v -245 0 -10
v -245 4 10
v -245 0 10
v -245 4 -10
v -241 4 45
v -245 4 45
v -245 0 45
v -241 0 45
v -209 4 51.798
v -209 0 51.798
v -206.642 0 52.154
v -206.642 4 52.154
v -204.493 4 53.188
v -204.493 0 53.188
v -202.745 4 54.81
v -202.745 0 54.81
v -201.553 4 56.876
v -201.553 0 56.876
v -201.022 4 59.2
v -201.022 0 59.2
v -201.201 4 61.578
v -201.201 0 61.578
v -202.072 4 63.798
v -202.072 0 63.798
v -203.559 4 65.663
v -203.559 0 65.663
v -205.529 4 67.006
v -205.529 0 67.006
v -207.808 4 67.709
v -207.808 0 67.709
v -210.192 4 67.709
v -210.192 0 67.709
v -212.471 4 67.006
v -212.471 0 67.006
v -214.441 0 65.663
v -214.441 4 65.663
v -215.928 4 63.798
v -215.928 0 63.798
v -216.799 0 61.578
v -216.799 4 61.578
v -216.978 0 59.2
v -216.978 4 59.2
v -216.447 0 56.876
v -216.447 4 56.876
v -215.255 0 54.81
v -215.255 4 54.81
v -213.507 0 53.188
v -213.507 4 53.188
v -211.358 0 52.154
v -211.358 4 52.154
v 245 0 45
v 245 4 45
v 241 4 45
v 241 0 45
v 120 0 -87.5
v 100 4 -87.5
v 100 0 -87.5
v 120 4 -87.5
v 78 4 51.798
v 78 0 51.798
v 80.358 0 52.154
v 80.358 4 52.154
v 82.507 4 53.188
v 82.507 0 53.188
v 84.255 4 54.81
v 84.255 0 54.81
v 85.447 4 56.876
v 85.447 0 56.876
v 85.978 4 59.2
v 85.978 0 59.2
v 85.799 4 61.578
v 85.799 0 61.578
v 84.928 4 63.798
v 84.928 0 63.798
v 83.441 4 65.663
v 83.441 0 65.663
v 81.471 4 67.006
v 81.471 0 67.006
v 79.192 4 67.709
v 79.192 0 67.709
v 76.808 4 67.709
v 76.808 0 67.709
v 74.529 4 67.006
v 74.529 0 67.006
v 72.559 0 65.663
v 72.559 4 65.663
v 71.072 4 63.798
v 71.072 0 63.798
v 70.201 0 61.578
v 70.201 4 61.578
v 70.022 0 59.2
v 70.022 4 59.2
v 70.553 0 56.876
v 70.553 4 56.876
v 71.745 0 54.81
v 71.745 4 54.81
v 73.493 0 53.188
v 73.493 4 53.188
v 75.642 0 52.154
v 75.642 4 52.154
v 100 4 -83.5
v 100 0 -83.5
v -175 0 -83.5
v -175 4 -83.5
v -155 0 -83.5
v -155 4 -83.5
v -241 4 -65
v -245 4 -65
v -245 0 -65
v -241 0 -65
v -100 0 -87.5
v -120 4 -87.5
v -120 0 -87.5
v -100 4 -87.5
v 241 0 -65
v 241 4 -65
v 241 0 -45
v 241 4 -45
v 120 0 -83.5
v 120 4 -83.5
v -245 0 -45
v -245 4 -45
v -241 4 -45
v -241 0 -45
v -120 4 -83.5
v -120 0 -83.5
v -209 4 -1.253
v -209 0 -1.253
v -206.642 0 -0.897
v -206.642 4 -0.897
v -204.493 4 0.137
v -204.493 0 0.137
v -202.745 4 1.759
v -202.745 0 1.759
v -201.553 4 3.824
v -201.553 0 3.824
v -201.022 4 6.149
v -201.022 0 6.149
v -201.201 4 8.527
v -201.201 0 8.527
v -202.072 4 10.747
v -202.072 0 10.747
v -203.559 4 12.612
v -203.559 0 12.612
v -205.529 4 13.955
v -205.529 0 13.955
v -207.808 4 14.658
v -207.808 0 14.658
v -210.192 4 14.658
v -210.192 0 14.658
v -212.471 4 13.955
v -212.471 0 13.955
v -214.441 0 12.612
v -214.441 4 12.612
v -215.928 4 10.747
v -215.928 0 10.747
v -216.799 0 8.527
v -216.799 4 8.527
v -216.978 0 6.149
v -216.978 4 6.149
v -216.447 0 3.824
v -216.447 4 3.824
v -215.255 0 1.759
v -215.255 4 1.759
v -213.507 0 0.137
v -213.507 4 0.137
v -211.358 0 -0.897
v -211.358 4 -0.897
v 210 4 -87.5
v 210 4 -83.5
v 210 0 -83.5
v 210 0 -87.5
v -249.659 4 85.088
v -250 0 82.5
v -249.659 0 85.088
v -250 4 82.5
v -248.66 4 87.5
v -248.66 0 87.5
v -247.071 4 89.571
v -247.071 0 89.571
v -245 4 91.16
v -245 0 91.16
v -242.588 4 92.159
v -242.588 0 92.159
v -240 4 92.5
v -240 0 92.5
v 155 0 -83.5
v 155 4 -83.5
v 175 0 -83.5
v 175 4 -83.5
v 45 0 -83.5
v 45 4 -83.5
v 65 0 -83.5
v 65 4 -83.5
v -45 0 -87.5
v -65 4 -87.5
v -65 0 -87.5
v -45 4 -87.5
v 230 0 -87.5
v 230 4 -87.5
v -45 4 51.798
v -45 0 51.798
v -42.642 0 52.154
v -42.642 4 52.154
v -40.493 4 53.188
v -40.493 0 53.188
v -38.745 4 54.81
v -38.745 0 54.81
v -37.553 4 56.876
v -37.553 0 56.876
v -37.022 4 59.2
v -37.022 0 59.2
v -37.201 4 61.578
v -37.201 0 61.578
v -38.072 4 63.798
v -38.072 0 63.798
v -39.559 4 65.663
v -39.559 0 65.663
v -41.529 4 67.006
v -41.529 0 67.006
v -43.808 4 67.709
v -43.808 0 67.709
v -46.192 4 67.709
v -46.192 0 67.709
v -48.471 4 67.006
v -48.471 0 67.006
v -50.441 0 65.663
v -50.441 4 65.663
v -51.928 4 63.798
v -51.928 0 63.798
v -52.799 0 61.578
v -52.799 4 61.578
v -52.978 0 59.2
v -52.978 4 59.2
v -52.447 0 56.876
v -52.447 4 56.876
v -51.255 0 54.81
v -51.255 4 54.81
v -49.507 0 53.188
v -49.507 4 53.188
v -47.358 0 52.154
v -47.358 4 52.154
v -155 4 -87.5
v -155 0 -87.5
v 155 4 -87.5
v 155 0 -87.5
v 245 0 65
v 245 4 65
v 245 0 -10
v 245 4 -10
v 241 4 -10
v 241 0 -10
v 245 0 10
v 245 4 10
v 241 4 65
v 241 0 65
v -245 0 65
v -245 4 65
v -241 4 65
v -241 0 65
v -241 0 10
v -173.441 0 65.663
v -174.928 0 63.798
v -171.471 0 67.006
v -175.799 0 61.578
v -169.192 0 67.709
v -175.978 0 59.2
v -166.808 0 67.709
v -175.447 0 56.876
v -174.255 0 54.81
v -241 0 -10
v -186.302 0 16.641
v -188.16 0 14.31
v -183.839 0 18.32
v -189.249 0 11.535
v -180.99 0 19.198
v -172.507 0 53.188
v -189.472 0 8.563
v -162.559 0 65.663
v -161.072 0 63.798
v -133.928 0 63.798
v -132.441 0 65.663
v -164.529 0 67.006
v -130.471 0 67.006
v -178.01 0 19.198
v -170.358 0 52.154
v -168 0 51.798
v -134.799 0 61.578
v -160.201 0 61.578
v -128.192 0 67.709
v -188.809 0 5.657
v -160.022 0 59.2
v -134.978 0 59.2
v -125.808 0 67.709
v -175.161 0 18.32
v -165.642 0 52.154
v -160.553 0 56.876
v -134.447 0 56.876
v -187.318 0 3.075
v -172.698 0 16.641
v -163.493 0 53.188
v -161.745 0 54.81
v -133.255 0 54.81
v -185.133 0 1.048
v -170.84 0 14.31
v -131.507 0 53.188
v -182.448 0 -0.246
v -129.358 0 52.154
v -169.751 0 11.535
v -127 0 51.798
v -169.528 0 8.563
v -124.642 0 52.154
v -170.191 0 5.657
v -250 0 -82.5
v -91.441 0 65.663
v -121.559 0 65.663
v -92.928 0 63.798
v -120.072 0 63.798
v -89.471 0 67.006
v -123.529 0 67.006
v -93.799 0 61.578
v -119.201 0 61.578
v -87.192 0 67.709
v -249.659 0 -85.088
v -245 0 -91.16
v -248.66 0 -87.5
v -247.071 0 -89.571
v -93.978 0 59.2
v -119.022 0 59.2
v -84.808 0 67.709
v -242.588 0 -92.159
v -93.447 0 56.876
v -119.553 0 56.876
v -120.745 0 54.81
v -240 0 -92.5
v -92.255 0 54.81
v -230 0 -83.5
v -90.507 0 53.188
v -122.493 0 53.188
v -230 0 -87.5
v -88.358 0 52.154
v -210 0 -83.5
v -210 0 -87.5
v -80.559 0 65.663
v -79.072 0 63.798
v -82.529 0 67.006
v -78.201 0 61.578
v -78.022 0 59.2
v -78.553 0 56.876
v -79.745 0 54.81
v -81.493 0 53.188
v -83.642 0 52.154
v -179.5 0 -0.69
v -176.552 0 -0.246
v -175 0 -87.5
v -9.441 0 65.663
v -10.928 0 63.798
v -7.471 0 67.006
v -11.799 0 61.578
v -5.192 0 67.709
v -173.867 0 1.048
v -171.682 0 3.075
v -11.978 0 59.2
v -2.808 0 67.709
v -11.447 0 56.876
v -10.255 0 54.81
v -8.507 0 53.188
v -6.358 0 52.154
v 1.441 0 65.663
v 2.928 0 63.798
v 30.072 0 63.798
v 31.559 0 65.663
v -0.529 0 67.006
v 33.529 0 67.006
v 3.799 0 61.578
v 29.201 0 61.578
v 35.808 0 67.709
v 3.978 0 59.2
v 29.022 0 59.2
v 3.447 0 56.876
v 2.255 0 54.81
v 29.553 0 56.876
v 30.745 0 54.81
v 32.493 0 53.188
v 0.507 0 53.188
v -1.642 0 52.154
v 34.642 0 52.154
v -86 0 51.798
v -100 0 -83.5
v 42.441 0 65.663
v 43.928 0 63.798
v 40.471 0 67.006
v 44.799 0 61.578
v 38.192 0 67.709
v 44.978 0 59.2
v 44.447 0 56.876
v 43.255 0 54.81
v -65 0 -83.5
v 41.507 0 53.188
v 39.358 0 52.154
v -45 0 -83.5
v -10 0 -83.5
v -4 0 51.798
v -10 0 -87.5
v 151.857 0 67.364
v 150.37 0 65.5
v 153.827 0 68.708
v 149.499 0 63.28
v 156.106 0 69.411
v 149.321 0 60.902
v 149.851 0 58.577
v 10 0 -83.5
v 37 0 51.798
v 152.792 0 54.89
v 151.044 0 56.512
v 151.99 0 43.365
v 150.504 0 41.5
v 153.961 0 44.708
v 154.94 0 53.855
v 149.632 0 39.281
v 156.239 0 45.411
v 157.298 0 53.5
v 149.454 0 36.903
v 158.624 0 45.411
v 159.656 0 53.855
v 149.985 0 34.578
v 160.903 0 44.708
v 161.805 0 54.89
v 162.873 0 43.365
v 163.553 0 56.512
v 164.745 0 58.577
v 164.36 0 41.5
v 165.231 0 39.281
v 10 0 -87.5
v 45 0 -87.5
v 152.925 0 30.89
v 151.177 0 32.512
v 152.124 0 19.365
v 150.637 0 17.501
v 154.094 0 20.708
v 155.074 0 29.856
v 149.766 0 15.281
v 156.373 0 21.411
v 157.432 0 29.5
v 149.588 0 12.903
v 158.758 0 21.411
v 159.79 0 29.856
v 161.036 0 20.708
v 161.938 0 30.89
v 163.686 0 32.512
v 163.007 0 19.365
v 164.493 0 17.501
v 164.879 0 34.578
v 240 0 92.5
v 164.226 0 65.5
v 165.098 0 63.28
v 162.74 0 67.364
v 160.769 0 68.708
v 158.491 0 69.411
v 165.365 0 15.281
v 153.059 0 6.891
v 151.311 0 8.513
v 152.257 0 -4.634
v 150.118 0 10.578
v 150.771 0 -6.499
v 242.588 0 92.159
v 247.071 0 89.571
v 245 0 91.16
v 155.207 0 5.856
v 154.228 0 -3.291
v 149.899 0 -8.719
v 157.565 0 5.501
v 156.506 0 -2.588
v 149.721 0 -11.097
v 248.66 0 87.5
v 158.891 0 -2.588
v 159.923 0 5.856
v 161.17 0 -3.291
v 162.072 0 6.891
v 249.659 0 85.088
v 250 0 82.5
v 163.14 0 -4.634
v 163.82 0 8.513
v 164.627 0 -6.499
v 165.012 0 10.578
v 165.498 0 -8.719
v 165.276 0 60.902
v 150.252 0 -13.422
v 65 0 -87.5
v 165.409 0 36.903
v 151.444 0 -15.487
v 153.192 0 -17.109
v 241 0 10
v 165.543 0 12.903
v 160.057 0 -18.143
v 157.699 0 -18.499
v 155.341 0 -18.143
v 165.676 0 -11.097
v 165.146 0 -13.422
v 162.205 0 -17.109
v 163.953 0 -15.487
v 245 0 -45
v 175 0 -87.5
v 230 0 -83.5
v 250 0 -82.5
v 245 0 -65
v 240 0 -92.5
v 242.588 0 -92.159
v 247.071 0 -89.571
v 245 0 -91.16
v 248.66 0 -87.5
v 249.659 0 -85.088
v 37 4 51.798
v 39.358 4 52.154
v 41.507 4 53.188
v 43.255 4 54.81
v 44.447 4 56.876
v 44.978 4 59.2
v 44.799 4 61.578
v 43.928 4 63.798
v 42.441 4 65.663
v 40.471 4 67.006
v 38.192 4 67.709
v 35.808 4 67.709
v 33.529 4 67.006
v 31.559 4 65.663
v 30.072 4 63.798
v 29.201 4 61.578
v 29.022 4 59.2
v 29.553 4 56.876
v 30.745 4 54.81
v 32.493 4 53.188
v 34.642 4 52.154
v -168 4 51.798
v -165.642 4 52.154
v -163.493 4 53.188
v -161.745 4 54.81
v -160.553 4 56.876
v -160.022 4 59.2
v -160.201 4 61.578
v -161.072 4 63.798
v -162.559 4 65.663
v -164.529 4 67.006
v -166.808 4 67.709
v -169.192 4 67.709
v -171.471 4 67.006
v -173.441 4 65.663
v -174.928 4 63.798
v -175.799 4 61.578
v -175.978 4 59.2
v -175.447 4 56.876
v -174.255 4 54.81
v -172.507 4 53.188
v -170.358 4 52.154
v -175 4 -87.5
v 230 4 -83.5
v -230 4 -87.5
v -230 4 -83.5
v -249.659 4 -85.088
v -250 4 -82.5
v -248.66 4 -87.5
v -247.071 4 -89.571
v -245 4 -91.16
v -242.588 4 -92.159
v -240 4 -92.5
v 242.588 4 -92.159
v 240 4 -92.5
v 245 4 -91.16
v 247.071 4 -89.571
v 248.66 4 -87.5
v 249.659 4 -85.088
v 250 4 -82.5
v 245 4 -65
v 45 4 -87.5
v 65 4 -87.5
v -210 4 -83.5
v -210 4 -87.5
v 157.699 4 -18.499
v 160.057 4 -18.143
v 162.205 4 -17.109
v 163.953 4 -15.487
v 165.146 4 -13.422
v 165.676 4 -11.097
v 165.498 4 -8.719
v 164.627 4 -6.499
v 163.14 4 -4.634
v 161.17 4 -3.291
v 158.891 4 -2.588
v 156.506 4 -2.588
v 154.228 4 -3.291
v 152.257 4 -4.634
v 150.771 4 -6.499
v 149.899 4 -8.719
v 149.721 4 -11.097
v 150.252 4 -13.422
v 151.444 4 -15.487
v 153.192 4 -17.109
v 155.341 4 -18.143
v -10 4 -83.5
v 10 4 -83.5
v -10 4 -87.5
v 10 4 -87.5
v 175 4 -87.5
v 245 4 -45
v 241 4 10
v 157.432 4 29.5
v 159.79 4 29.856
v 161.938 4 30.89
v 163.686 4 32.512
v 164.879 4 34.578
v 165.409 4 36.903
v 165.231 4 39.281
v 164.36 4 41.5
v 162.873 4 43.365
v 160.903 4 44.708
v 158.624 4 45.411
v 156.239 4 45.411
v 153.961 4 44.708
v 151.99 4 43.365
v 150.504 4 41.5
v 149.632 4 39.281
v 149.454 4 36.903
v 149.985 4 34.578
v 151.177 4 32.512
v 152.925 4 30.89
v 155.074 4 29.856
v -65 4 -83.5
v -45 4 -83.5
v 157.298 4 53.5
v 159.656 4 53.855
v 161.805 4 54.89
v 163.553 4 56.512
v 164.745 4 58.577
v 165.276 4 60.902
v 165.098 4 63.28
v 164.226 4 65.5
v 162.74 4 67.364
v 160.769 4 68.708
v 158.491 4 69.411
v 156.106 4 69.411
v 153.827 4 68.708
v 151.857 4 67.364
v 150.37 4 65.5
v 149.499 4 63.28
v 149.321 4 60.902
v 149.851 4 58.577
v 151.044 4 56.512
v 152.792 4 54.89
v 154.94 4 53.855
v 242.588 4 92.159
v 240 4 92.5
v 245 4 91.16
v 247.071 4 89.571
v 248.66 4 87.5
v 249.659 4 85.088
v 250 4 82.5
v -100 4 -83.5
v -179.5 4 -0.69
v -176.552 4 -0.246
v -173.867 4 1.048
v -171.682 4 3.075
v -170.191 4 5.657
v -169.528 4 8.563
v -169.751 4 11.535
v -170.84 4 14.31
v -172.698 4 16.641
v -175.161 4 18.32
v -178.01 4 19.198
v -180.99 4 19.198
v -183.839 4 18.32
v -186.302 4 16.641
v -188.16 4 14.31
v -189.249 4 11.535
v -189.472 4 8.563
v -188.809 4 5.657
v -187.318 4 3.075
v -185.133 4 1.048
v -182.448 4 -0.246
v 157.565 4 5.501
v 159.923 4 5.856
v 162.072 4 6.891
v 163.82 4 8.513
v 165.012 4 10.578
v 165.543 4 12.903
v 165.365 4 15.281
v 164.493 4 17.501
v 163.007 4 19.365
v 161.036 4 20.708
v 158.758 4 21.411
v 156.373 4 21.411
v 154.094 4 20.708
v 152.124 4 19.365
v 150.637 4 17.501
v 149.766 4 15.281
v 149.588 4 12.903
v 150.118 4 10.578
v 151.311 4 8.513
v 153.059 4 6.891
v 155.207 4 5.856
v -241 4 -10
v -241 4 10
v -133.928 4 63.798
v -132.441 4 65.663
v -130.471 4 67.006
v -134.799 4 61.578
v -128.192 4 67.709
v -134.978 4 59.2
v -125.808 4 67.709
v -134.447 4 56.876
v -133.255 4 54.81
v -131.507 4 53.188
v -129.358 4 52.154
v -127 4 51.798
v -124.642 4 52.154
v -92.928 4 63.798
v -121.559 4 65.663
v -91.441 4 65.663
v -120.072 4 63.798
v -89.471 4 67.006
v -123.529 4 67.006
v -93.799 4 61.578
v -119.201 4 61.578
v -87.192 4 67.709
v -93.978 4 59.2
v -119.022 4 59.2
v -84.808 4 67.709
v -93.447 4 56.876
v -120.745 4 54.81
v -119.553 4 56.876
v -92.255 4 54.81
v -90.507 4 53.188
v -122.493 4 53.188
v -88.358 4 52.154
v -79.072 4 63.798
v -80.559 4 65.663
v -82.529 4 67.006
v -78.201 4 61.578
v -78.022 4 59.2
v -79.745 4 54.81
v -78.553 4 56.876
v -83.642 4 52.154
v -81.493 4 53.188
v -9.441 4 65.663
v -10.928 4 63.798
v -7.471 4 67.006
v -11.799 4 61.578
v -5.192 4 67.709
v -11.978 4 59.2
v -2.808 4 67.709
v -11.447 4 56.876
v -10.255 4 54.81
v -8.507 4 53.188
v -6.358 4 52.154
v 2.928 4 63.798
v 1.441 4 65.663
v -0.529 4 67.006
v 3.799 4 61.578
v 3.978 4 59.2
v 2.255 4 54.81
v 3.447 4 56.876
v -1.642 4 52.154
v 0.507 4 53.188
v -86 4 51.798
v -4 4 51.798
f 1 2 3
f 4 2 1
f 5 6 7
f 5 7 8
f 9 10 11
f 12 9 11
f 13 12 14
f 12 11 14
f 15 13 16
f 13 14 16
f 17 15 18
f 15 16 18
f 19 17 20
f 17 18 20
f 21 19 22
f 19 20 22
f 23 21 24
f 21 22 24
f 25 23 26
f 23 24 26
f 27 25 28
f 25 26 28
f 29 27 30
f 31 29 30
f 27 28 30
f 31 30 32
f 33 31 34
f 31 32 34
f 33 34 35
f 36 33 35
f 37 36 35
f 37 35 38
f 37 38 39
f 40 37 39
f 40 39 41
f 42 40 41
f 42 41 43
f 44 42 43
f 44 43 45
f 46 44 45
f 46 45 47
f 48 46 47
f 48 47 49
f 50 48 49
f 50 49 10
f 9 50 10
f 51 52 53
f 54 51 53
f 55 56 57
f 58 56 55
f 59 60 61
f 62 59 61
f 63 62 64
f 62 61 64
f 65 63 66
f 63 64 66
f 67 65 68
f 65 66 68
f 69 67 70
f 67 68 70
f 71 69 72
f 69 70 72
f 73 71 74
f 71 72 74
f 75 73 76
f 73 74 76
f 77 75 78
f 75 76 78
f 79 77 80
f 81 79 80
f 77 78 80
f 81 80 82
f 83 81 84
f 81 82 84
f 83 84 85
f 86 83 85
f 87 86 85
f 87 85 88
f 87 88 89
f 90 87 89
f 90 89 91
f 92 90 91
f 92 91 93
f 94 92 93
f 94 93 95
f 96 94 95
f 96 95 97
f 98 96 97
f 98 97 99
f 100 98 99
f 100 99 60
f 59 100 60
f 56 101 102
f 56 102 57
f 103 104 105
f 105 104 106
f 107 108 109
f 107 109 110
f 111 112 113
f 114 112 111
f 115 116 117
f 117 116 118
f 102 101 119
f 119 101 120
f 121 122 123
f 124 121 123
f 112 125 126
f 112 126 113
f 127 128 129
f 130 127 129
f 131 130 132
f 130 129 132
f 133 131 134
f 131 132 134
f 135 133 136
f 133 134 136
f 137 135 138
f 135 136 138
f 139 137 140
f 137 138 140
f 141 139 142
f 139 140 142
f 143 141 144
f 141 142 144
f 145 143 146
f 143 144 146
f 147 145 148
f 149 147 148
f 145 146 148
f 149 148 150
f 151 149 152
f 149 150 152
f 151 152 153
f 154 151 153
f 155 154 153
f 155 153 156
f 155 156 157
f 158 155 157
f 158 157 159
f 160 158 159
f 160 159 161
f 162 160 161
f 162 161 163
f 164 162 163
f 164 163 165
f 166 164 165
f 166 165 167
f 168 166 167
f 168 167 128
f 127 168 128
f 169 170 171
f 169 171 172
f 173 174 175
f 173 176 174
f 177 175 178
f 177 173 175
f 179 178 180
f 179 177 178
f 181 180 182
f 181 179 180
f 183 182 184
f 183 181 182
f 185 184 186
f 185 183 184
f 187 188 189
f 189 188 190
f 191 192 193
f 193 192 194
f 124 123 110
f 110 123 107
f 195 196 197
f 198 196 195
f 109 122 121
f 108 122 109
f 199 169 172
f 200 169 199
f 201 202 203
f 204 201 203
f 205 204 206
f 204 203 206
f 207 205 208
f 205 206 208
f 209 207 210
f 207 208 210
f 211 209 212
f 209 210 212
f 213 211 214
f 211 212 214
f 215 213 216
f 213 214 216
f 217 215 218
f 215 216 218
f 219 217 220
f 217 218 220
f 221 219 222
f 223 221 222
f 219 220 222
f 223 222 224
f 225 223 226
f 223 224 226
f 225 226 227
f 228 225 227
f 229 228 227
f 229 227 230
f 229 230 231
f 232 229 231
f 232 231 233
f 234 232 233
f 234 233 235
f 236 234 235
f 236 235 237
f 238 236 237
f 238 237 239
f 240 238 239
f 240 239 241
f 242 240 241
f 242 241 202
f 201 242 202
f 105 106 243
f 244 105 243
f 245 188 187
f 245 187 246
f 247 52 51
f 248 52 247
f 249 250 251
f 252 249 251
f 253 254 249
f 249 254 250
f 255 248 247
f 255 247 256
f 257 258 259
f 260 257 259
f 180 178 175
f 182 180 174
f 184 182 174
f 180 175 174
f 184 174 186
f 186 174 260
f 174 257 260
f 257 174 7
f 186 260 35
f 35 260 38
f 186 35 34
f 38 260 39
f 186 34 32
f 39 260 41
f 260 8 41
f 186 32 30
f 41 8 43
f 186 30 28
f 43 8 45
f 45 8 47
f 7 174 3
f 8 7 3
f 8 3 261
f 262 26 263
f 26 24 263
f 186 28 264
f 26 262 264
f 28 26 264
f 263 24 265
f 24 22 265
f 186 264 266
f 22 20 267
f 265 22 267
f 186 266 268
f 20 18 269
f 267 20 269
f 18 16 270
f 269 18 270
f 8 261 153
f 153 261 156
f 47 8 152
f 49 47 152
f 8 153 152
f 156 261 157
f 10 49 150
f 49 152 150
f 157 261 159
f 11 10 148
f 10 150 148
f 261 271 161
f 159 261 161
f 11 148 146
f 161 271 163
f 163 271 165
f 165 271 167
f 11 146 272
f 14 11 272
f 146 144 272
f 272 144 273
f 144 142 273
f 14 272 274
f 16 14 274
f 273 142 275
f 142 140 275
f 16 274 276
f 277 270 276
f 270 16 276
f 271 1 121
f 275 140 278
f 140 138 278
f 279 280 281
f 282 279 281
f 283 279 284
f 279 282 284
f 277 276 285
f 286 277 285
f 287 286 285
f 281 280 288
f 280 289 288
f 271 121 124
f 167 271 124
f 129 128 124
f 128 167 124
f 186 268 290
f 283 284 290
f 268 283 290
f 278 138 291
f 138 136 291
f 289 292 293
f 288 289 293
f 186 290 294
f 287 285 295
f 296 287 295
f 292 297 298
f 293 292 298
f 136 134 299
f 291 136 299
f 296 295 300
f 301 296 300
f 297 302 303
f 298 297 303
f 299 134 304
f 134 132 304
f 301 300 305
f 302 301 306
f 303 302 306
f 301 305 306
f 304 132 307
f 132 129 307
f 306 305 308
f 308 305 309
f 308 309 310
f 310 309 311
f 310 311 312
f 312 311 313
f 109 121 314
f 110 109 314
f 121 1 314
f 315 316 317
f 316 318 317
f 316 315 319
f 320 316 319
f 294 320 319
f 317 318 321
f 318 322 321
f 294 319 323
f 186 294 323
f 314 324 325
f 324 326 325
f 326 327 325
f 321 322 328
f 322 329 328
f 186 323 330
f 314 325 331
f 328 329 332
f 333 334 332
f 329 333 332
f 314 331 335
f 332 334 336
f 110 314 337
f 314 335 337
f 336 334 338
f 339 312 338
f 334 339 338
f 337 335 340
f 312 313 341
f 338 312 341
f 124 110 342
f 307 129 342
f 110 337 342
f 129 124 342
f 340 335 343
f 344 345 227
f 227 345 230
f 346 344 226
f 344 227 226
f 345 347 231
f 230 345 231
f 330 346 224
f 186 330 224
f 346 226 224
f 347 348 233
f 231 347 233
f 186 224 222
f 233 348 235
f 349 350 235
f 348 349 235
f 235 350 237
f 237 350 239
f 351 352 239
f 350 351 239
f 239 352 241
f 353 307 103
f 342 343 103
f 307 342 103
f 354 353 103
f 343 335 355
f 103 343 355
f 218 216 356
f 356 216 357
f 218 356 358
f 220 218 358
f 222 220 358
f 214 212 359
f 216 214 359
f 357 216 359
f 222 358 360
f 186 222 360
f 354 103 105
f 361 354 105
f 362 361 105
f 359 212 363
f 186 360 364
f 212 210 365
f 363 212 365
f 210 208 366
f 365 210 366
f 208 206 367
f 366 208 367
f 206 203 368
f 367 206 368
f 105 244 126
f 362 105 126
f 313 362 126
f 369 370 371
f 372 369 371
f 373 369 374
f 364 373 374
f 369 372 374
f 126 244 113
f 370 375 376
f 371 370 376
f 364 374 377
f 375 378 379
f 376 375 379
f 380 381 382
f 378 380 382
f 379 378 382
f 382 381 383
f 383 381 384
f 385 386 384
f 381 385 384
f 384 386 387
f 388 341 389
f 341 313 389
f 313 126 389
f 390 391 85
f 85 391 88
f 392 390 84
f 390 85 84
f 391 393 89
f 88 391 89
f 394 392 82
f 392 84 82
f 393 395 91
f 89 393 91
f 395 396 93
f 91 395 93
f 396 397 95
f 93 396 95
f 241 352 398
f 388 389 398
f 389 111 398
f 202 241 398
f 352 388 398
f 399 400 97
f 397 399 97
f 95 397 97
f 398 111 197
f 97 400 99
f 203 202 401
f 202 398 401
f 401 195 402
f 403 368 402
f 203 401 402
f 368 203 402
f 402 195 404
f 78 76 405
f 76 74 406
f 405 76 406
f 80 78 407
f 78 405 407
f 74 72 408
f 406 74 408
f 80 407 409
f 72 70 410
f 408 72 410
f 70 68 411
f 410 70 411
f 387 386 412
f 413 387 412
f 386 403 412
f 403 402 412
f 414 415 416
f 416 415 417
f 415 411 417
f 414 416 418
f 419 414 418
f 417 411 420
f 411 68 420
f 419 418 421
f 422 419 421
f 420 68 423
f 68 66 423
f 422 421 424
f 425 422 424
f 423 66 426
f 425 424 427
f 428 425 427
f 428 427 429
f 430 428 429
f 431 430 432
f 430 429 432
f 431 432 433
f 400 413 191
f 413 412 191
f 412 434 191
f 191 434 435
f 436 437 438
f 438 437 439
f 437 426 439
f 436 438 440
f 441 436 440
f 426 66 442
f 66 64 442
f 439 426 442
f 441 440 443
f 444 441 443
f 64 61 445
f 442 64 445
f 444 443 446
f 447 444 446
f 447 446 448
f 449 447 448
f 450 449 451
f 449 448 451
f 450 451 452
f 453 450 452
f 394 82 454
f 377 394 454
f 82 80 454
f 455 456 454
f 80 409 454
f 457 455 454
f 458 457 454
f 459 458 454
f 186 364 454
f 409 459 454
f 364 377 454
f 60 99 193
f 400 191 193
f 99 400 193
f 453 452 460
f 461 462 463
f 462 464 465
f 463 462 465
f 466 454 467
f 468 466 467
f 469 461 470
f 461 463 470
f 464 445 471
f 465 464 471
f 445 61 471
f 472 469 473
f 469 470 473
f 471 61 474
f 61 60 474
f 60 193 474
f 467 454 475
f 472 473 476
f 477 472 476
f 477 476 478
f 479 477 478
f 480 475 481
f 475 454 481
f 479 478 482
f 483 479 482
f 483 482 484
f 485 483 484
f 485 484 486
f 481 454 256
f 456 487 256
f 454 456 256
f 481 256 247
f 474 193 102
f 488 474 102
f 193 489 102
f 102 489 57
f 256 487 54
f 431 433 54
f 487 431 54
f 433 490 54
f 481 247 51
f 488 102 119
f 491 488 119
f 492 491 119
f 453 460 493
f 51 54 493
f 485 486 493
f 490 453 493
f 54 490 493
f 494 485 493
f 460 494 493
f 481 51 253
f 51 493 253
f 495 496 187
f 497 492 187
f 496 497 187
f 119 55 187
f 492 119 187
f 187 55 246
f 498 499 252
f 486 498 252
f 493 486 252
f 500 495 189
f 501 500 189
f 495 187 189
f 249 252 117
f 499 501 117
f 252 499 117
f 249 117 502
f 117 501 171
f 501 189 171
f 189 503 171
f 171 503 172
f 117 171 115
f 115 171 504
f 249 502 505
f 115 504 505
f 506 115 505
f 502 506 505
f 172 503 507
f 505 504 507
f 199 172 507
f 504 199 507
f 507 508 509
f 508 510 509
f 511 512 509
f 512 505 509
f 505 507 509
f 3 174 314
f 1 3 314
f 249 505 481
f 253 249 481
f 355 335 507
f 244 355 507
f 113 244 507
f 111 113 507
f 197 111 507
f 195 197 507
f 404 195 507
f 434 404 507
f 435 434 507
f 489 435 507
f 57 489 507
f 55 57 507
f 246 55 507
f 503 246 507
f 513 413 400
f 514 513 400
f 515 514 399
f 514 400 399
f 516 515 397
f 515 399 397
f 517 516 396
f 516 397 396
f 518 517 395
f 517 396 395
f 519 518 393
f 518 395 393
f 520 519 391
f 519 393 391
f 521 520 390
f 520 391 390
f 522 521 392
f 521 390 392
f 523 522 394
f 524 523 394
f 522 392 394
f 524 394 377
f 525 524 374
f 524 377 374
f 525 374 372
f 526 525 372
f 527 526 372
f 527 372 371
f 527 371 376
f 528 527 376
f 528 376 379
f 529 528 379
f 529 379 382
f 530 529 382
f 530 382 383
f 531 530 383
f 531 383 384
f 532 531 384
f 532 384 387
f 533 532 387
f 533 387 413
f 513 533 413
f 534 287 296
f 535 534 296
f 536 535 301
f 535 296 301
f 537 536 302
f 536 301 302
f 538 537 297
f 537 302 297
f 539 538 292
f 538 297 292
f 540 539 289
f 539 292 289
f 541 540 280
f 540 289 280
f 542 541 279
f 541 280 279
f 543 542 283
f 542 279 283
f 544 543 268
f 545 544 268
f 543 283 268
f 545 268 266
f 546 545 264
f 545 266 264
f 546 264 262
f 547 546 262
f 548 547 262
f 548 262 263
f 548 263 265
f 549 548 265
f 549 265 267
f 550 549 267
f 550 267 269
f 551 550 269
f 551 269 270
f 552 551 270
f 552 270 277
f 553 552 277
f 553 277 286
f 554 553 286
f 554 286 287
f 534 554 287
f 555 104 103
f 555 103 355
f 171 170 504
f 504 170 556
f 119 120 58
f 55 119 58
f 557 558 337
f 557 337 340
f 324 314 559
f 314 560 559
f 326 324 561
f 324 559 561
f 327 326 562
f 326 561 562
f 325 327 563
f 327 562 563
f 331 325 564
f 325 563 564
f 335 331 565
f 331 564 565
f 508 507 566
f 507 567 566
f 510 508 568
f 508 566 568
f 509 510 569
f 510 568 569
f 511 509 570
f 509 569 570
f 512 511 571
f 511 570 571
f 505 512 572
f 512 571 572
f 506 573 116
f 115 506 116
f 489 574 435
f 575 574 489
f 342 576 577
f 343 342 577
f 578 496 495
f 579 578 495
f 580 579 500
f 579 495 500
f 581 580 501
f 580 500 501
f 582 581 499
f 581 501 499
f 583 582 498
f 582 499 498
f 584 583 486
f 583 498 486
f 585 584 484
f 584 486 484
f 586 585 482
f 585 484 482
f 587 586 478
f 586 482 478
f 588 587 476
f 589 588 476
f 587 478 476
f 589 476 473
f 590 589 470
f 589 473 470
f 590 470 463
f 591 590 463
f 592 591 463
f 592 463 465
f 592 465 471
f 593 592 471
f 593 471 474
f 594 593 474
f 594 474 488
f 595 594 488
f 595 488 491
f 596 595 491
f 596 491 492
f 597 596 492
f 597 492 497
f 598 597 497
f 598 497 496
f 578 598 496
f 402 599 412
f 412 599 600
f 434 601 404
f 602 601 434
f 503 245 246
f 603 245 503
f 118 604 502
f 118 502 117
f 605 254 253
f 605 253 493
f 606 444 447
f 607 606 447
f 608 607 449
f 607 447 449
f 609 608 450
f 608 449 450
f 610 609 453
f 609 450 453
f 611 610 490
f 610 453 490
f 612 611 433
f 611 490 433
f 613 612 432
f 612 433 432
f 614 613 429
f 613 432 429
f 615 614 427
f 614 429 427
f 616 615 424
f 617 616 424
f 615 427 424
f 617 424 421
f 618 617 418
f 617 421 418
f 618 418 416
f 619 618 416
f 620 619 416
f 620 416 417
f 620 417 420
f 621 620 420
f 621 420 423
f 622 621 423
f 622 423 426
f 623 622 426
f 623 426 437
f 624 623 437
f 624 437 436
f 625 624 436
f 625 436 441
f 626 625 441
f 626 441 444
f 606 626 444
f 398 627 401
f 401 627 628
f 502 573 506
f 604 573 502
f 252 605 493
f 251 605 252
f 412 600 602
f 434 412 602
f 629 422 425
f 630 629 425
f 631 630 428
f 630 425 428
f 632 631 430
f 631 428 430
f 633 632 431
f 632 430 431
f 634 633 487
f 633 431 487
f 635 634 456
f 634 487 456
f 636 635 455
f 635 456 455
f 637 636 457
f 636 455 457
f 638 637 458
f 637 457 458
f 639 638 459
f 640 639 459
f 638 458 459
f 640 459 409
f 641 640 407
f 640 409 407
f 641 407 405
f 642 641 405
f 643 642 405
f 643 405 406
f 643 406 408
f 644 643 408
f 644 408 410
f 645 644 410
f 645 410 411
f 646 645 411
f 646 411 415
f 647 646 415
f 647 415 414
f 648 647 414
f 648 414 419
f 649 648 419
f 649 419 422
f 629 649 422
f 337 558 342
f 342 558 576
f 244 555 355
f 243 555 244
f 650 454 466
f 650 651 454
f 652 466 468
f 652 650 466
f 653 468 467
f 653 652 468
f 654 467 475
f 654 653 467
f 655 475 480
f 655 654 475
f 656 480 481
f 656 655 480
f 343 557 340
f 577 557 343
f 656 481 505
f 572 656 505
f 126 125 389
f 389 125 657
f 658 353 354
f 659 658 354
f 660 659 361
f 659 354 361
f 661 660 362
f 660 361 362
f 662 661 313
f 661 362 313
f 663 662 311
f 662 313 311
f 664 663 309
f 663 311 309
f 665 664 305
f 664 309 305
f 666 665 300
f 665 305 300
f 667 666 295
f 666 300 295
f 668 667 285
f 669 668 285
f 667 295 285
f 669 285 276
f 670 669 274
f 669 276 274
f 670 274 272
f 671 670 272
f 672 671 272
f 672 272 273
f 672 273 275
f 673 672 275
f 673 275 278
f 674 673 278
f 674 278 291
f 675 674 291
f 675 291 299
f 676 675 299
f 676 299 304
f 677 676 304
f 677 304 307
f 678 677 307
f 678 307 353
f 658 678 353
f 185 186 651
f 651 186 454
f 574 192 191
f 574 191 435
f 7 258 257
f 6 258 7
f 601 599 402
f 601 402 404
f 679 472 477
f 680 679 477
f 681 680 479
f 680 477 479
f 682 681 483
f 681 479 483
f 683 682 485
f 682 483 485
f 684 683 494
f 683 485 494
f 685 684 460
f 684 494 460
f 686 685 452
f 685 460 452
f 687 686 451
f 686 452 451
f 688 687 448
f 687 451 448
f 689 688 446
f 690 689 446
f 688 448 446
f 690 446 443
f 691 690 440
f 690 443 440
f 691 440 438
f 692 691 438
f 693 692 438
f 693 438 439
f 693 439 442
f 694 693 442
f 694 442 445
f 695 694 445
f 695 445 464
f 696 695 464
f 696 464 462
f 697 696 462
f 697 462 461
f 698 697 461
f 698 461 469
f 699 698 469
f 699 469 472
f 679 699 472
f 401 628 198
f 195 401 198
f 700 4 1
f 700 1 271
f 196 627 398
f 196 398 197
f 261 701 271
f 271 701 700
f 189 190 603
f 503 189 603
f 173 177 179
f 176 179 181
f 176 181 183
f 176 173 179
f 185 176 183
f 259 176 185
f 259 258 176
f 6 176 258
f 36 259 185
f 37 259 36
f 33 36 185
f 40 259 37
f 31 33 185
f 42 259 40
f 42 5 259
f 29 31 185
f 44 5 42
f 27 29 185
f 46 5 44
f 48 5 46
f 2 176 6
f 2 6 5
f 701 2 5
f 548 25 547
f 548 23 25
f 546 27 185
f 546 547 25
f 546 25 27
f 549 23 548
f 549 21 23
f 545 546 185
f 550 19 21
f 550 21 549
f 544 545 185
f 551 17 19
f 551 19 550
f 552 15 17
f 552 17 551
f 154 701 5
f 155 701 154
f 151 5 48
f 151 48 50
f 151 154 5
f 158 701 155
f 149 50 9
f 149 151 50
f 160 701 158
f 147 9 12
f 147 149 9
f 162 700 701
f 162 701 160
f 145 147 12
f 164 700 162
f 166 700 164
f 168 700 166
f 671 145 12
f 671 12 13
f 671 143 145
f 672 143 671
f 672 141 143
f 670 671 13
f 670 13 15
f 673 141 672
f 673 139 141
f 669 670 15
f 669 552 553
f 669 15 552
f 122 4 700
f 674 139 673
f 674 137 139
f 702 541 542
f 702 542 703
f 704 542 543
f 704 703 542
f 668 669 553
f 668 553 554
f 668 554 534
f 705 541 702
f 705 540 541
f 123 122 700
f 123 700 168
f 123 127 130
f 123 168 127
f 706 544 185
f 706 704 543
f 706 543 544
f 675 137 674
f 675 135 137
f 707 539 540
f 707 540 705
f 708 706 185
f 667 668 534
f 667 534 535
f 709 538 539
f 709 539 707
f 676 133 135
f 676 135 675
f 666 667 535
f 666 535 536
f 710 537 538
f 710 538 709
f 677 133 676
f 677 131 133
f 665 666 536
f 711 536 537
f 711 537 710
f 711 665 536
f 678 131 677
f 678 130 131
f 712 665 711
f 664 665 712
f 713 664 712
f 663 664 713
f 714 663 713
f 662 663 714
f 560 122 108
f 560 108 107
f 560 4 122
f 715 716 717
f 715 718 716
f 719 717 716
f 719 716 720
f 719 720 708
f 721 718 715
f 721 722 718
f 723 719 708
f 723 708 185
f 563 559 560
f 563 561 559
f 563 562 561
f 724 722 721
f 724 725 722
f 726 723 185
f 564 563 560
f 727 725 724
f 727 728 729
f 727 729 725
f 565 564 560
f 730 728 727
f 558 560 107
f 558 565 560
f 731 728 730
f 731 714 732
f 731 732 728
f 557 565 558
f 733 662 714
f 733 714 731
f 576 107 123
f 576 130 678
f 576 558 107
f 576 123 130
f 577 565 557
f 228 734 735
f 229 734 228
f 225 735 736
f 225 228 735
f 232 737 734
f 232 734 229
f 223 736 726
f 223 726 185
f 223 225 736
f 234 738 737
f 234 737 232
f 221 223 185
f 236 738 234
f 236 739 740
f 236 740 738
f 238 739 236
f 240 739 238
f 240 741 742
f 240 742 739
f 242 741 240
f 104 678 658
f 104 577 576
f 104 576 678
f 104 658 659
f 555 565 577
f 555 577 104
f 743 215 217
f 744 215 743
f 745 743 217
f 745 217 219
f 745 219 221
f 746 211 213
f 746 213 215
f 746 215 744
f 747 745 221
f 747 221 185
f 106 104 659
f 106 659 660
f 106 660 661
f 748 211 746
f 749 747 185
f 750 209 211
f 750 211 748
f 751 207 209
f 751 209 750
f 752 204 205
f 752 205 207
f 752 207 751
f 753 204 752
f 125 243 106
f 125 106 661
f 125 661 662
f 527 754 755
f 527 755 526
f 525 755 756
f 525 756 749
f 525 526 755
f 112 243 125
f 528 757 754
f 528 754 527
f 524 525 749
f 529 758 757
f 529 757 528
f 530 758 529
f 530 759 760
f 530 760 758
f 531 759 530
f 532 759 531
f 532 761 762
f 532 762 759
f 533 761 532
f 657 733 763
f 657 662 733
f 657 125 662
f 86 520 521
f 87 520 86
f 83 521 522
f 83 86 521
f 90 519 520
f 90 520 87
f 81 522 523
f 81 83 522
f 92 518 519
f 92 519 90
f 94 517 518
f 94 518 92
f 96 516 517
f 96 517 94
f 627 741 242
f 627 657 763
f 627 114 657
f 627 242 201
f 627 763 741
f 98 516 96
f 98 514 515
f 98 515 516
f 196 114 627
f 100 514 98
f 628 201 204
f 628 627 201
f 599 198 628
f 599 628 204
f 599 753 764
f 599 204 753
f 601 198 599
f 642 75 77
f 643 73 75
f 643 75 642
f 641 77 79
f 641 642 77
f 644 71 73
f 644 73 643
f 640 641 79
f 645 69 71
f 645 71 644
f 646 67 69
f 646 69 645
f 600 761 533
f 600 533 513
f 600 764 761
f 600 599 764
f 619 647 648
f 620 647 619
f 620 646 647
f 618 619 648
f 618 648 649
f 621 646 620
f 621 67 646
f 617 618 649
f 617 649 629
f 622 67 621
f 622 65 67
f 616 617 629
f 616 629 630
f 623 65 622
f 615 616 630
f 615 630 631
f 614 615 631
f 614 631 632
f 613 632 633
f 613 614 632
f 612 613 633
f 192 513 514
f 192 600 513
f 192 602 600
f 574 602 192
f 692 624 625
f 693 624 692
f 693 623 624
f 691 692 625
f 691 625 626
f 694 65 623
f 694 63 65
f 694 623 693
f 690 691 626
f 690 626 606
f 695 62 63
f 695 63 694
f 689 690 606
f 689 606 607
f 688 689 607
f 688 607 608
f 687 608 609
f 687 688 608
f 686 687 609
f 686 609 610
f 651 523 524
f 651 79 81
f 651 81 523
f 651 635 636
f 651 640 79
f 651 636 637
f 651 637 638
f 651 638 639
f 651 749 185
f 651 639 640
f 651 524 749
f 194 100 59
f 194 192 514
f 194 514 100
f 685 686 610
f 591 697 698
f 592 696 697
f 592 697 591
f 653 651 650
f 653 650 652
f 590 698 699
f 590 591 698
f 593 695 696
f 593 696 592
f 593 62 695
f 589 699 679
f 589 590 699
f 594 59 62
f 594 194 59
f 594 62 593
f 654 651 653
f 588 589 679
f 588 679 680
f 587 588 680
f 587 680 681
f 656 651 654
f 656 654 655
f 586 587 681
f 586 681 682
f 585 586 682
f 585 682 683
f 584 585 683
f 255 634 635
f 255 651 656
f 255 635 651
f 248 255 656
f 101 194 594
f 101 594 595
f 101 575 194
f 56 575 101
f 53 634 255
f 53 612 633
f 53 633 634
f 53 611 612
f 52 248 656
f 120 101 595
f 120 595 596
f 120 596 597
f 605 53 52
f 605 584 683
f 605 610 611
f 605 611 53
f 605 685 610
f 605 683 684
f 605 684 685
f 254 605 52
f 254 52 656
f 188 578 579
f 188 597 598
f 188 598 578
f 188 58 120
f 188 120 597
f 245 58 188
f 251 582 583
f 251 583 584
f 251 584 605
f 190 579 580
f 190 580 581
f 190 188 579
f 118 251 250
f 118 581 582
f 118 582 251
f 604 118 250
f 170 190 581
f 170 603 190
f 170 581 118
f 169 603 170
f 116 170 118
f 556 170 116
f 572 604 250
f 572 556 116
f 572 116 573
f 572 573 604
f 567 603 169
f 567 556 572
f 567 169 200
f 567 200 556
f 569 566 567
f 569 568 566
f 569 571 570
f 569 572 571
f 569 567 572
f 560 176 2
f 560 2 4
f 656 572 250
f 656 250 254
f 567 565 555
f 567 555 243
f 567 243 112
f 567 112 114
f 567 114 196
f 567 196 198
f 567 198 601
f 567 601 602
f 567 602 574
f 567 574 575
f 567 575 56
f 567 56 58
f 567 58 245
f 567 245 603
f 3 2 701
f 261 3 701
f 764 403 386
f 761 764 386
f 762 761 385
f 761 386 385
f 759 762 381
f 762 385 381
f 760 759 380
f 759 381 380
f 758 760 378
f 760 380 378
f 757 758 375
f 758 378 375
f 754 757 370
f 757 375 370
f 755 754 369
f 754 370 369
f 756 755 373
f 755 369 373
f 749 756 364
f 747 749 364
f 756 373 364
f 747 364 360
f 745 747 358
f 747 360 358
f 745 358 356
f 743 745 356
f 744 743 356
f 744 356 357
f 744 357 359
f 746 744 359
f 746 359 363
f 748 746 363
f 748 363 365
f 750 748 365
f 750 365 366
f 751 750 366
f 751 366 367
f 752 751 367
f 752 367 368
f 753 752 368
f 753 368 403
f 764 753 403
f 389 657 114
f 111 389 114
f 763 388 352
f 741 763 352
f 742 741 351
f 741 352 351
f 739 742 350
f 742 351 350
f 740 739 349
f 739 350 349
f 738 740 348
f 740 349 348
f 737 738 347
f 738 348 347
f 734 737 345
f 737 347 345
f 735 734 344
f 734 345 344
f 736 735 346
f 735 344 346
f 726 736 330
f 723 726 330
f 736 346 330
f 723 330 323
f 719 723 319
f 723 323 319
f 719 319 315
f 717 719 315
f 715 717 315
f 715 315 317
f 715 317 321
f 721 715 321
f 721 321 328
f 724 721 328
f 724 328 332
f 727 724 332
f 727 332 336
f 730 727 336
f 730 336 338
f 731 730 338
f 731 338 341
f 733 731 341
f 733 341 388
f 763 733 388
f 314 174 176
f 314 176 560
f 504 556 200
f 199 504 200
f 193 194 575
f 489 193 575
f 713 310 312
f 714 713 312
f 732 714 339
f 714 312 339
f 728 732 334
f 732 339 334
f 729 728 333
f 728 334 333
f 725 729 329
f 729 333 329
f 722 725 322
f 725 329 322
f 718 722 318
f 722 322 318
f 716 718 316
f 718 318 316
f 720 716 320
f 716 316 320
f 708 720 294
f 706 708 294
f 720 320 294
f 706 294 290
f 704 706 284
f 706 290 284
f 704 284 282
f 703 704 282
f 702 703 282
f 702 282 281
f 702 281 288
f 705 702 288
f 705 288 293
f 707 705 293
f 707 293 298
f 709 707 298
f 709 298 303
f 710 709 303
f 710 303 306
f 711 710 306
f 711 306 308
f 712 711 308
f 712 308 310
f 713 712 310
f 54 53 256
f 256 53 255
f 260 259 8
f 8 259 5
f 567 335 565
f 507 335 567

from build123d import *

# Parameters (mm, degrees)
SKETCH2_W                    = 500
SKETCH2_H                    = 185
BASE_DEPTH                   = 4
SKETCH3_W                    = 20
SKETCH3_H                    = 4
TOP_HOLE_DEFINITION_DEPTH    = 267.593792126
TOP_HOLE_PATTERN_COUNT       = 5
TOP_HOLE_PATTERN_PITCH       = 55
TOP_HOLE_PATTERN_COUNT_DIR2  = 5
TOP_HOLE_PATTERN_PITCH_DIR2  = 55
SKETCH4_W                    = 4
SKETCH4_H                    = 20
LEFT_HOLE_DEFINITION_DEPTH   = 267.593792126
LEFT_HOLE_PATTERN_COUNT      = 2
LEFT_HOLE_PATTERN_PITCH      = 55
LEFT_HOLE_PATTERN_COUNT_DIR2 = 2
LEFT_HOLE_PATTERN_PITCH_DIR2 = 55
FILLET1_R                    = 10
MIRROR2_COPY_1_SKETCH_W      = 4
MIRROR2_COPY_1_SKETCH_H      = 20
MIRROR2_COPY_1_DEPTH         = 267.593792126
MIRROR2_COPY_2_SKETCH_W      = 4
MIRROR2_COPY_2_SKETCH_H      = 20
MIRROR2_COPY_2_DEPTH         = 267.593792126
MIRROR2_COPY_3_SKETCH_W      = 4
MIRROR2_COPY_3_SKETCH_H      = 20
MIRROR2_COPY_3_DEPTH         = 267.593792126
SKETCH7_R                    = 8
SKETCH7_R_2                  = 10
CUT_EXTRUDE5_DEPTH           = 267.593792126


with BuildPart() as part:
    # Sketch2 → Base (new body)
    with BuildSketch(Plane(origin=(0, 0, 0), x_dir=(1, 0, 0), z_dir=(0, 1, 0))):
        Rectangle(SKETCH2_W, SKETCH2_H)
    extrude(amount=BASE_DEPTH)

    # Sketch3 → Top Hole Definition (cut, through all)
    with BuildSketch(Plane(origin=(0, 4, 0), x_dir=(1, 0, 0), z_dir=(0, 1, 0))):
        with Locations((0, 85.5)):
            Rectangle(SKETCH3_W, SKETCH3_H)
    top_hole_definition = extrude(amount=-TOP_HOLE_DEFINITION_DEPTH, mode=Mode.SUBTRACT)

    # Top Hole Pattern: Top Hole Definition 5 × 5
    with Locations(*[Vector(-1, 0, 0) * (i * TOP_HOLE_PATTERN_PITCH) + Vector(1, 0, 0) * (j * TOP_HOLE_PATTERN_PITCH_DIR2) for i in range(TOP_HOLE_PATTERN_COUNT) for j in range(TOP_HOLE_PATTERN_COUNT_DIR2) if (i, j) != (0, 0)]):
        add(top_hole_definition, mode=Mode.SUBTRACT)

    # Sketch4 → Left Hole Definition (cut, through all)
    with BuildSketch(Plane(origin=(0, 4, 0), x_dir=(1, 0, 0), z_dir=(0, 1, 0))):
        with Locations((-243, 0)):
            Rectangle(SKETCH4_W, SKETCH4_H)
    left_hole_definition = extrude(amount=-LEFT_HOLE_DEFINITION_DEPTH, mode=Mode.SUBTRACT)

    # Left Hole Pattern: Left Hole Definition 2 × 2
    with Locations(*[Vector(0, 0, -1) * (i * LEFT_HOLE_PATTERN_PITCH) + Vector(0, 0, 1) * (j * LEFT_HOLE_PATTERN_PITCH_DIR2) for i in range(LEFT_HOLE_PATTERN_COUNT) for j in range(LEFT_HOLE_PATTERN_COUNT_DIR2) if (i, j) != (0, 0)]):
        add(left_hole_definition, mode=Mode.SUBTRACT)

    # Fillet1
    fillet1_edges = [part.edges().sort_by_distance(p)[0] for p in [
        (250, 2, -92.5),
        (250, 2, 92.5),
        (-250, 2, -92.5),
        (-250, 2, 92.5),
    ]]
    fillet(fillet1_edges, radius=FILLET1_R)

    # Mirror2: Left Hole Definition across plane
    add(left_hole_definition.mirror(Plane(origin=(0, 0, 0), x_dir=(0, 0, 1), z_dir=(1, 0, 0))), mode=Mode.SUBTRACT)

    # Mirror2 copy 1 sketch → Mirror2 copy 1 (cut, through all)
    with BuildSketch(Plane(origin=(0, 4, 55), x_dir=(-1, 0, 0), z_dir=(0, 1, 0))):
        with Locations((-243, 0)):
            Rectangle(MIRROR2_COPY_1_SKETCH_W, MIRROR2_COPY_1_SKETCH_H)
    extrude(amount=-MIRROR2_COPY_1_DEPTH, mode=Mode.SUBTRACT)

    # Mirror2 copy 2 sketch → Mirror2 copy 2 (cut, through all)
    with BuildSketch(Plane(origin=(0, 4, -55), x_dir=(-1, 0, 0), z_dir=(0, 1, 0))):
        with Locations((-243, 0)):
            Rectangle(MIRROR2_COPY_2_SKETCH_W, MIRROR2_COPY_2_SKETCH_H)
    extrude(amount=-MIRROR2_COPY_2_DEPTH, mode=Mode.SUBTRACT)

    # Mirror2 copy 3 sketch → Mirror2 copy 3 (cut, through all)
    with BuildSketch(Plane(origin=(0, 4, 0), x_dir=(-1, 0, 0), z_dir=(0, 1, 0))):
        with Locations((-243, 0)):
            Rectangle(MIRROR2_COPY_3_SKETCH_W, MIRROR2_COPY_3_SKETCH_H)
    extrude(amount=-MIRROR2_COPY_3_DEPTH, mode=Mode.SUBTRACT)

    # Sketch7 → Cut-Extrude5 (cut, through all)
    with BuildSketch(Plane.XZ):
        with Locations((-209, 59.798294078)):
            Circle(SKETCH7_R)
        with Locations((-168, 59.798294078)):
            Circle(SKETCH7_R)
        with Locations((-127, 59.798294078)):
            Circle(SKETCH7_R)
        with Locations((-86, 59.798294078)):
            Circle(SKETCH7_R)
        with Locations((-45, 59.798294078)):
            Circle(SKETCH7_R)
        with Locations((-4, 59.798294078)):
            Circle(SKETCH7_R)
        with Locations((37, 59.798294078)):
            Circle(SKETCH7_R)
        with Locations((78, 59.798294078)):
            Circle(SKETCH7_R)
        with Locations((-179.5, 9.310158007)):
            Circle(SKETCH7_R_2)
        with Locations((-209, 6.747125767)):
            Circle(SKETCH7_R)
        with Locations((157.298294078, 61.5)):
            Circle(SKETCH7_R)
        with Locations((157.431778922, 37.500371215)):
            Circle(SKETCH7_R)
        with Locations((157.565263767, 13.500742431)):
            Circle(SKETCH7_R)
        with Locations((157.698748611, -10.498886354)):
            Circle(SKETCH7_R)
    extrude(amount=-CUT_EXTRUDE5_DEPTH, mode=Mode.SUBTRACT)


solid = part.part
